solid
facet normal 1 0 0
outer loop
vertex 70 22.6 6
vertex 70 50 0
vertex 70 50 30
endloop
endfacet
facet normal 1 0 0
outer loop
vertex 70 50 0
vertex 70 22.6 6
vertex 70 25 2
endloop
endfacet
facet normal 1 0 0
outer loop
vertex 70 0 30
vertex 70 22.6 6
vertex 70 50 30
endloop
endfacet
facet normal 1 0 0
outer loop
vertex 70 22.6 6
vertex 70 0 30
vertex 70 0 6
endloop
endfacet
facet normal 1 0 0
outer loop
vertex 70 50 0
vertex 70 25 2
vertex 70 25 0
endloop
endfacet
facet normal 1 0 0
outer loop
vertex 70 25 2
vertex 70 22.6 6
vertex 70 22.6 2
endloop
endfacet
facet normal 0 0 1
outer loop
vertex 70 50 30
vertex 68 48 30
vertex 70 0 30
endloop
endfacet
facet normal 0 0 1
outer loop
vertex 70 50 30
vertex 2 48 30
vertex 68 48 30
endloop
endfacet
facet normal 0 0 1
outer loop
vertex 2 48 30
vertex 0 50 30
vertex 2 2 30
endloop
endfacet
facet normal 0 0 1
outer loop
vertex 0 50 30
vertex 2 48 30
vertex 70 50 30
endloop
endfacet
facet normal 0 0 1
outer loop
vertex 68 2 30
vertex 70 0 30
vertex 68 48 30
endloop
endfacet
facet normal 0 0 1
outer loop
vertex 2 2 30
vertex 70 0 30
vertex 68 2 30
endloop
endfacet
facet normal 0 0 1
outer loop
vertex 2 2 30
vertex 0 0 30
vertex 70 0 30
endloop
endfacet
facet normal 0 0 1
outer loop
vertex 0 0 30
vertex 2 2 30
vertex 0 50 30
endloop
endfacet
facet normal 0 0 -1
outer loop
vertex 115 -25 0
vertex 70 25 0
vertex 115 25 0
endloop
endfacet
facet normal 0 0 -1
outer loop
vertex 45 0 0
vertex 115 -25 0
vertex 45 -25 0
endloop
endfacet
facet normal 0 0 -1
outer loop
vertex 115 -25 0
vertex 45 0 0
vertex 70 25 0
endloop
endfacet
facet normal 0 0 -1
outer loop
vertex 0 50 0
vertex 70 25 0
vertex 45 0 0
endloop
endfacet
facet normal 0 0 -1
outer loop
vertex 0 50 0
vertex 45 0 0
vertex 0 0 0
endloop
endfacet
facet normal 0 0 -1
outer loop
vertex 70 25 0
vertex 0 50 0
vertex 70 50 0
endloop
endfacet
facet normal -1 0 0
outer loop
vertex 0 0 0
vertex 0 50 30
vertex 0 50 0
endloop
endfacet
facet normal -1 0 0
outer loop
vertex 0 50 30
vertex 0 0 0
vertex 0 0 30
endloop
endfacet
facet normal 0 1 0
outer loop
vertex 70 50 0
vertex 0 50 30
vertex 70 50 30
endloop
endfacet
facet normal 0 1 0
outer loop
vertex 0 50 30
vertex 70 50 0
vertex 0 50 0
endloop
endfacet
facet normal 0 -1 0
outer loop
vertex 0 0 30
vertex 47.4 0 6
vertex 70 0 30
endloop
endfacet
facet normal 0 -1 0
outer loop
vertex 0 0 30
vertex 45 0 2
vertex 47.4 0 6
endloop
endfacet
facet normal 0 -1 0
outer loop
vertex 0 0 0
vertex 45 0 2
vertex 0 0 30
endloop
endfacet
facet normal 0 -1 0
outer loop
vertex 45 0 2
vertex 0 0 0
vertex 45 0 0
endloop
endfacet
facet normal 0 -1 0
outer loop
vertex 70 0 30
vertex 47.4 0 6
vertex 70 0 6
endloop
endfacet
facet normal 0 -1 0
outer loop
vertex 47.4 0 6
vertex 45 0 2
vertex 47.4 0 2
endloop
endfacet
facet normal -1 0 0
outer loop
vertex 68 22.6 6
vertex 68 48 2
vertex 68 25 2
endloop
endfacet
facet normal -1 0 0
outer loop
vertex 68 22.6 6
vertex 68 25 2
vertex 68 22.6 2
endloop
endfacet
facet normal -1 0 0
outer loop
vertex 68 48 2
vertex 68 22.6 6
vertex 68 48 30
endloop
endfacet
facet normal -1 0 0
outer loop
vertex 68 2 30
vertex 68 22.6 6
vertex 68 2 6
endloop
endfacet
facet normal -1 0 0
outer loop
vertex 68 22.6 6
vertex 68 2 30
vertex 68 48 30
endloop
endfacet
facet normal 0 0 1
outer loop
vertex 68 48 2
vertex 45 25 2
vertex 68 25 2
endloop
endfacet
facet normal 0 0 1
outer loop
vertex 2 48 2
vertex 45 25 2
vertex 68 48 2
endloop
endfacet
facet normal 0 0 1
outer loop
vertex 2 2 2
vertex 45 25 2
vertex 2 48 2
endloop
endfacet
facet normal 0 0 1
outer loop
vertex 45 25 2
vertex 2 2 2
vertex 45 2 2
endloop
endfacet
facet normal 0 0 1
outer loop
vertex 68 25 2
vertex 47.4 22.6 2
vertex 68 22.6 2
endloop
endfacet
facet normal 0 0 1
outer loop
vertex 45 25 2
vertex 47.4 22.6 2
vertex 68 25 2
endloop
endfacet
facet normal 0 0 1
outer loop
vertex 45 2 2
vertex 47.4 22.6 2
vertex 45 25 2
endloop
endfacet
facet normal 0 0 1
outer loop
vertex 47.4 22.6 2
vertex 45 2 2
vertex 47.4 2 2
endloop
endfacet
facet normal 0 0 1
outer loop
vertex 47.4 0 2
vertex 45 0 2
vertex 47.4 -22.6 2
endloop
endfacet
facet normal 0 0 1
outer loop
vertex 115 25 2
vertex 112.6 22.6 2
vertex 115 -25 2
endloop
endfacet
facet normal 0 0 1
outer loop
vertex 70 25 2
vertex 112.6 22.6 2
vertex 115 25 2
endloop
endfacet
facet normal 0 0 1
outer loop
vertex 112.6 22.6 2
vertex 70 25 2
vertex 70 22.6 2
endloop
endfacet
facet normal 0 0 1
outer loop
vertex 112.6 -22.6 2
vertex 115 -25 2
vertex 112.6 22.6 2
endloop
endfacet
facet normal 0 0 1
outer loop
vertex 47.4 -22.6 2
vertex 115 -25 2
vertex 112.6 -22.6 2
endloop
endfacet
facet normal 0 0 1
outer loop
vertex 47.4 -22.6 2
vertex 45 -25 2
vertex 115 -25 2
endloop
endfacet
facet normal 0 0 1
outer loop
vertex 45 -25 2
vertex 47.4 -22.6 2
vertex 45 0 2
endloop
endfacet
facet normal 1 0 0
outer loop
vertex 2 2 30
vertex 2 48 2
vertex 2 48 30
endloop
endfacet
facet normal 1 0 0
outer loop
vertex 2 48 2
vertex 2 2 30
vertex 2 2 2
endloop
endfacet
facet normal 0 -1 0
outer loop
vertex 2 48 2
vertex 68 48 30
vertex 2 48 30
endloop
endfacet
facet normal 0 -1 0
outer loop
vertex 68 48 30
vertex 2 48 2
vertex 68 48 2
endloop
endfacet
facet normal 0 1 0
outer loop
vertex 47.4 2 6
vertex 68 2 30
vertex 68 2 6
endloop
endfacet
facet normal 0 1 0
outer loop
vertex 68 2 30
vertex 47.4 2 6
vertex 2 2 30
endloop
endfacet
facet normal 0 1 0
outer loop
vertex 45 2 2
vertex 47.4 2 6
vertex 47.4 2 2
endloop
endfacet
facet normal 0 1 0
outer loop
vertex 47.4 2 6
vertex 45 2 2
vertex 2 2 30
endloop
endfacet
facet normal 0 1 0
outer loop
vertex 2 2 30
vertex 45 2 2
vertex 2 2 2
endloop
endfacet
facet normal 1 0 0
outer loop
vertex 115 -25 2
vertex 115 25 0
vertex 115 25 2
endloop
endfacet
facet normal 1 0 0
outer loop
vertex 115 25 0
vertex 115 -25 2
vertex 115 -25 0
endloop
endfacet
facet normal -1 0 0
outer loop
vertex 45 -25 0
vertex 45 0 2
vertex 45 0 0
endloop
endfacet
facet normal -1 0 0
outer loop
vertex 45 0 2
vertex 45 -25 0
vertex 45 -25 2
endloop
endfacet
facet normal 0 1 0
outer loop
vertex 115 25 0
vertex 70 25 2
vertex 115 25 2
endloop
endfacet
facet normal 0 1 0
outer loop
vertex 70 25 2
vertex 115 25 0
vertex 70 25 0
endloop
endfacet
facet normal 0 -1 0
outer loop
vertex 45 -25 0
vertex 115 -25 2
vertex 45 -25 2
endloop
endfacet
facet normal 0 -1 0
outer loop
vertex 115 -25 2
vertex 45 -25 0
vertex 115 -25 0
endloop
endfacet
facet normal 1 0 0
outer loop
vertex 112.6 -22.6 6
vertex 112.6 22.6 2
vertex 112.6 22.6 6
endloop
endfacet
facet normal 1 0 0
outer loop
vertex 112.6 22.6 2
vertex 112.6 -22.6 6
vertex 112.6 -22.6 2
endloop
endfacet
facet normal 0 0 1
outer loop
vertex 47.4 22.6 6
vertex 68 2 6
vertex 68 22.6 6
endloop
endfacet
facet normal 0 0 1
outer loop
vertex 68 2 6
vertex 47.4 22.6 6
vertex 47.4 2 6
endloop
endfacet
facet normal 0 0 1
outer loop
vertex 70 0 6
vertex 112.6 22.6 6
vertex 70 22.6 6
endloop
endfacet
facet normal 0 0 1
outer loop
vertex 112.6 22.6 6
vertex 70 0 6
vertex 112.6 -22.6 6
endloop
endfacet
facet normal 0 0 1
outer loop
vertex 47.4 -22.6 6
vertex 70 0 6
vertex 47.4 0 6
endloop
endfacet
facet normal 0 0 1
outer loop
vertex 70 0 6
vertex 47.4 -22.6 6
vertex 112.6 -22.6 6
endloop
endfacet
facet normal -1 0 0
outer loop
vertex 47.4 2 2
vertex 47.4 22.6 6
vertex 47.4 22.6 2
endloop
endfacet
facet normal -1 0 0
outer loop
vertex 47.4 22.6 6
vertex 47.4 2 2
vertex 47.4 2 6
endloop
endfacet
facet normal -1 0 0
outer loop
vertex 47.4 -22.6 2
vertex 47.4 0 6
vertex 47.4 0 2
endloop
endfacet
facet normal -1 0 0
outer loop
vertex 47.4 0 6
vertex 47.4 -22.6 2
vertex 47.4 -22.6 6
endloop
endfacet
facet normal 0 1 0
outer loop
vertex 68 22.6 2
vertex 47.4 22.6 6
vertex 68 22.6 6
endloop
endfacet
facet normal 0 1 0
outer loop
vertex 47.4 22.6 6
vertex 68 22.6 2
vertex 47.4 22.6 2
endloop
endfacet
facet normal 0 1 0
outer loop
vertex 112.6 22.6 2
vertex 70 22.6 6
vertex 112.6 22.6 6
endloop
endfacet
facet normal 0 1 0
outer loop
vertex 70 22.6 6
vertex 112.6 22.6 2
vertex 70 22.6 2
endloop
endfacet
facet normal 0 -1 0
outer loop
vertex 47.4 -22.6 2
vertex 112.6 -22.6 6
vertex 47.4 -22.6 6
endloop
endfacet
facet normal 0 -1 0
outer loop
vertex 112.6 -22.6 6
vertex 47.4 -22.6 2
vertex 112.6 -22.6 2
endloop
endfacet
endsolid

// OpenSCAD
// Two-part enclosure for small electronics board
// Print orientation: both parts on bed, lid on +X side of box

$fn = 64;

// ---- Box ----
box_x = 70;      // outer length (X)
box_y = 50;      // outer width (Y)
box_z = 30;      // outer height (Z)
wall = 2;        // wall thickness
floor = 2;       // floor thickness

// ---- Lid ----
lip_w = 65.6;    // lip outer length (X)
lip_d = 45.6;    // lip outer width (Y)
lip_h = 4;       // lip height (Z)
lip_t = 1.5;     // lip wall thickness

// ---- Misc ----
gap = 10;        // gap between parts
eps = 0.5;       // cutter overshoot

// Derived
inner_x = box_x - 2 * wall;
inner_y = box_y - 2 * wall;
lip_f  = lip_w - 0.4;   // lip outer size with 0.2 clearance each side
lip_b  = lip_d - 0.4;

module box() {
    difference() {
        translate([0, 0, 0])
            cube([box_x, box_y, box_z]);
        translate([wall, wall, floor])
            cube([inner_x, inner_y, box_z - floor]);   // open top
    }
}

module lid() {
    translate([0, 0, 0]) {
        // base plate
        translate([-box_x / 2, -box_y / 2, 0])
            cube([box_x, box_y, 2]);
        // lip on top, centred
        translate([-lip_f / 2, -lip_b / 2, 2])
            cube([lip_f, lip_b, lip_h]);
    }
}

box();
translate([box_x + gap, 0, 0])
    lid();
